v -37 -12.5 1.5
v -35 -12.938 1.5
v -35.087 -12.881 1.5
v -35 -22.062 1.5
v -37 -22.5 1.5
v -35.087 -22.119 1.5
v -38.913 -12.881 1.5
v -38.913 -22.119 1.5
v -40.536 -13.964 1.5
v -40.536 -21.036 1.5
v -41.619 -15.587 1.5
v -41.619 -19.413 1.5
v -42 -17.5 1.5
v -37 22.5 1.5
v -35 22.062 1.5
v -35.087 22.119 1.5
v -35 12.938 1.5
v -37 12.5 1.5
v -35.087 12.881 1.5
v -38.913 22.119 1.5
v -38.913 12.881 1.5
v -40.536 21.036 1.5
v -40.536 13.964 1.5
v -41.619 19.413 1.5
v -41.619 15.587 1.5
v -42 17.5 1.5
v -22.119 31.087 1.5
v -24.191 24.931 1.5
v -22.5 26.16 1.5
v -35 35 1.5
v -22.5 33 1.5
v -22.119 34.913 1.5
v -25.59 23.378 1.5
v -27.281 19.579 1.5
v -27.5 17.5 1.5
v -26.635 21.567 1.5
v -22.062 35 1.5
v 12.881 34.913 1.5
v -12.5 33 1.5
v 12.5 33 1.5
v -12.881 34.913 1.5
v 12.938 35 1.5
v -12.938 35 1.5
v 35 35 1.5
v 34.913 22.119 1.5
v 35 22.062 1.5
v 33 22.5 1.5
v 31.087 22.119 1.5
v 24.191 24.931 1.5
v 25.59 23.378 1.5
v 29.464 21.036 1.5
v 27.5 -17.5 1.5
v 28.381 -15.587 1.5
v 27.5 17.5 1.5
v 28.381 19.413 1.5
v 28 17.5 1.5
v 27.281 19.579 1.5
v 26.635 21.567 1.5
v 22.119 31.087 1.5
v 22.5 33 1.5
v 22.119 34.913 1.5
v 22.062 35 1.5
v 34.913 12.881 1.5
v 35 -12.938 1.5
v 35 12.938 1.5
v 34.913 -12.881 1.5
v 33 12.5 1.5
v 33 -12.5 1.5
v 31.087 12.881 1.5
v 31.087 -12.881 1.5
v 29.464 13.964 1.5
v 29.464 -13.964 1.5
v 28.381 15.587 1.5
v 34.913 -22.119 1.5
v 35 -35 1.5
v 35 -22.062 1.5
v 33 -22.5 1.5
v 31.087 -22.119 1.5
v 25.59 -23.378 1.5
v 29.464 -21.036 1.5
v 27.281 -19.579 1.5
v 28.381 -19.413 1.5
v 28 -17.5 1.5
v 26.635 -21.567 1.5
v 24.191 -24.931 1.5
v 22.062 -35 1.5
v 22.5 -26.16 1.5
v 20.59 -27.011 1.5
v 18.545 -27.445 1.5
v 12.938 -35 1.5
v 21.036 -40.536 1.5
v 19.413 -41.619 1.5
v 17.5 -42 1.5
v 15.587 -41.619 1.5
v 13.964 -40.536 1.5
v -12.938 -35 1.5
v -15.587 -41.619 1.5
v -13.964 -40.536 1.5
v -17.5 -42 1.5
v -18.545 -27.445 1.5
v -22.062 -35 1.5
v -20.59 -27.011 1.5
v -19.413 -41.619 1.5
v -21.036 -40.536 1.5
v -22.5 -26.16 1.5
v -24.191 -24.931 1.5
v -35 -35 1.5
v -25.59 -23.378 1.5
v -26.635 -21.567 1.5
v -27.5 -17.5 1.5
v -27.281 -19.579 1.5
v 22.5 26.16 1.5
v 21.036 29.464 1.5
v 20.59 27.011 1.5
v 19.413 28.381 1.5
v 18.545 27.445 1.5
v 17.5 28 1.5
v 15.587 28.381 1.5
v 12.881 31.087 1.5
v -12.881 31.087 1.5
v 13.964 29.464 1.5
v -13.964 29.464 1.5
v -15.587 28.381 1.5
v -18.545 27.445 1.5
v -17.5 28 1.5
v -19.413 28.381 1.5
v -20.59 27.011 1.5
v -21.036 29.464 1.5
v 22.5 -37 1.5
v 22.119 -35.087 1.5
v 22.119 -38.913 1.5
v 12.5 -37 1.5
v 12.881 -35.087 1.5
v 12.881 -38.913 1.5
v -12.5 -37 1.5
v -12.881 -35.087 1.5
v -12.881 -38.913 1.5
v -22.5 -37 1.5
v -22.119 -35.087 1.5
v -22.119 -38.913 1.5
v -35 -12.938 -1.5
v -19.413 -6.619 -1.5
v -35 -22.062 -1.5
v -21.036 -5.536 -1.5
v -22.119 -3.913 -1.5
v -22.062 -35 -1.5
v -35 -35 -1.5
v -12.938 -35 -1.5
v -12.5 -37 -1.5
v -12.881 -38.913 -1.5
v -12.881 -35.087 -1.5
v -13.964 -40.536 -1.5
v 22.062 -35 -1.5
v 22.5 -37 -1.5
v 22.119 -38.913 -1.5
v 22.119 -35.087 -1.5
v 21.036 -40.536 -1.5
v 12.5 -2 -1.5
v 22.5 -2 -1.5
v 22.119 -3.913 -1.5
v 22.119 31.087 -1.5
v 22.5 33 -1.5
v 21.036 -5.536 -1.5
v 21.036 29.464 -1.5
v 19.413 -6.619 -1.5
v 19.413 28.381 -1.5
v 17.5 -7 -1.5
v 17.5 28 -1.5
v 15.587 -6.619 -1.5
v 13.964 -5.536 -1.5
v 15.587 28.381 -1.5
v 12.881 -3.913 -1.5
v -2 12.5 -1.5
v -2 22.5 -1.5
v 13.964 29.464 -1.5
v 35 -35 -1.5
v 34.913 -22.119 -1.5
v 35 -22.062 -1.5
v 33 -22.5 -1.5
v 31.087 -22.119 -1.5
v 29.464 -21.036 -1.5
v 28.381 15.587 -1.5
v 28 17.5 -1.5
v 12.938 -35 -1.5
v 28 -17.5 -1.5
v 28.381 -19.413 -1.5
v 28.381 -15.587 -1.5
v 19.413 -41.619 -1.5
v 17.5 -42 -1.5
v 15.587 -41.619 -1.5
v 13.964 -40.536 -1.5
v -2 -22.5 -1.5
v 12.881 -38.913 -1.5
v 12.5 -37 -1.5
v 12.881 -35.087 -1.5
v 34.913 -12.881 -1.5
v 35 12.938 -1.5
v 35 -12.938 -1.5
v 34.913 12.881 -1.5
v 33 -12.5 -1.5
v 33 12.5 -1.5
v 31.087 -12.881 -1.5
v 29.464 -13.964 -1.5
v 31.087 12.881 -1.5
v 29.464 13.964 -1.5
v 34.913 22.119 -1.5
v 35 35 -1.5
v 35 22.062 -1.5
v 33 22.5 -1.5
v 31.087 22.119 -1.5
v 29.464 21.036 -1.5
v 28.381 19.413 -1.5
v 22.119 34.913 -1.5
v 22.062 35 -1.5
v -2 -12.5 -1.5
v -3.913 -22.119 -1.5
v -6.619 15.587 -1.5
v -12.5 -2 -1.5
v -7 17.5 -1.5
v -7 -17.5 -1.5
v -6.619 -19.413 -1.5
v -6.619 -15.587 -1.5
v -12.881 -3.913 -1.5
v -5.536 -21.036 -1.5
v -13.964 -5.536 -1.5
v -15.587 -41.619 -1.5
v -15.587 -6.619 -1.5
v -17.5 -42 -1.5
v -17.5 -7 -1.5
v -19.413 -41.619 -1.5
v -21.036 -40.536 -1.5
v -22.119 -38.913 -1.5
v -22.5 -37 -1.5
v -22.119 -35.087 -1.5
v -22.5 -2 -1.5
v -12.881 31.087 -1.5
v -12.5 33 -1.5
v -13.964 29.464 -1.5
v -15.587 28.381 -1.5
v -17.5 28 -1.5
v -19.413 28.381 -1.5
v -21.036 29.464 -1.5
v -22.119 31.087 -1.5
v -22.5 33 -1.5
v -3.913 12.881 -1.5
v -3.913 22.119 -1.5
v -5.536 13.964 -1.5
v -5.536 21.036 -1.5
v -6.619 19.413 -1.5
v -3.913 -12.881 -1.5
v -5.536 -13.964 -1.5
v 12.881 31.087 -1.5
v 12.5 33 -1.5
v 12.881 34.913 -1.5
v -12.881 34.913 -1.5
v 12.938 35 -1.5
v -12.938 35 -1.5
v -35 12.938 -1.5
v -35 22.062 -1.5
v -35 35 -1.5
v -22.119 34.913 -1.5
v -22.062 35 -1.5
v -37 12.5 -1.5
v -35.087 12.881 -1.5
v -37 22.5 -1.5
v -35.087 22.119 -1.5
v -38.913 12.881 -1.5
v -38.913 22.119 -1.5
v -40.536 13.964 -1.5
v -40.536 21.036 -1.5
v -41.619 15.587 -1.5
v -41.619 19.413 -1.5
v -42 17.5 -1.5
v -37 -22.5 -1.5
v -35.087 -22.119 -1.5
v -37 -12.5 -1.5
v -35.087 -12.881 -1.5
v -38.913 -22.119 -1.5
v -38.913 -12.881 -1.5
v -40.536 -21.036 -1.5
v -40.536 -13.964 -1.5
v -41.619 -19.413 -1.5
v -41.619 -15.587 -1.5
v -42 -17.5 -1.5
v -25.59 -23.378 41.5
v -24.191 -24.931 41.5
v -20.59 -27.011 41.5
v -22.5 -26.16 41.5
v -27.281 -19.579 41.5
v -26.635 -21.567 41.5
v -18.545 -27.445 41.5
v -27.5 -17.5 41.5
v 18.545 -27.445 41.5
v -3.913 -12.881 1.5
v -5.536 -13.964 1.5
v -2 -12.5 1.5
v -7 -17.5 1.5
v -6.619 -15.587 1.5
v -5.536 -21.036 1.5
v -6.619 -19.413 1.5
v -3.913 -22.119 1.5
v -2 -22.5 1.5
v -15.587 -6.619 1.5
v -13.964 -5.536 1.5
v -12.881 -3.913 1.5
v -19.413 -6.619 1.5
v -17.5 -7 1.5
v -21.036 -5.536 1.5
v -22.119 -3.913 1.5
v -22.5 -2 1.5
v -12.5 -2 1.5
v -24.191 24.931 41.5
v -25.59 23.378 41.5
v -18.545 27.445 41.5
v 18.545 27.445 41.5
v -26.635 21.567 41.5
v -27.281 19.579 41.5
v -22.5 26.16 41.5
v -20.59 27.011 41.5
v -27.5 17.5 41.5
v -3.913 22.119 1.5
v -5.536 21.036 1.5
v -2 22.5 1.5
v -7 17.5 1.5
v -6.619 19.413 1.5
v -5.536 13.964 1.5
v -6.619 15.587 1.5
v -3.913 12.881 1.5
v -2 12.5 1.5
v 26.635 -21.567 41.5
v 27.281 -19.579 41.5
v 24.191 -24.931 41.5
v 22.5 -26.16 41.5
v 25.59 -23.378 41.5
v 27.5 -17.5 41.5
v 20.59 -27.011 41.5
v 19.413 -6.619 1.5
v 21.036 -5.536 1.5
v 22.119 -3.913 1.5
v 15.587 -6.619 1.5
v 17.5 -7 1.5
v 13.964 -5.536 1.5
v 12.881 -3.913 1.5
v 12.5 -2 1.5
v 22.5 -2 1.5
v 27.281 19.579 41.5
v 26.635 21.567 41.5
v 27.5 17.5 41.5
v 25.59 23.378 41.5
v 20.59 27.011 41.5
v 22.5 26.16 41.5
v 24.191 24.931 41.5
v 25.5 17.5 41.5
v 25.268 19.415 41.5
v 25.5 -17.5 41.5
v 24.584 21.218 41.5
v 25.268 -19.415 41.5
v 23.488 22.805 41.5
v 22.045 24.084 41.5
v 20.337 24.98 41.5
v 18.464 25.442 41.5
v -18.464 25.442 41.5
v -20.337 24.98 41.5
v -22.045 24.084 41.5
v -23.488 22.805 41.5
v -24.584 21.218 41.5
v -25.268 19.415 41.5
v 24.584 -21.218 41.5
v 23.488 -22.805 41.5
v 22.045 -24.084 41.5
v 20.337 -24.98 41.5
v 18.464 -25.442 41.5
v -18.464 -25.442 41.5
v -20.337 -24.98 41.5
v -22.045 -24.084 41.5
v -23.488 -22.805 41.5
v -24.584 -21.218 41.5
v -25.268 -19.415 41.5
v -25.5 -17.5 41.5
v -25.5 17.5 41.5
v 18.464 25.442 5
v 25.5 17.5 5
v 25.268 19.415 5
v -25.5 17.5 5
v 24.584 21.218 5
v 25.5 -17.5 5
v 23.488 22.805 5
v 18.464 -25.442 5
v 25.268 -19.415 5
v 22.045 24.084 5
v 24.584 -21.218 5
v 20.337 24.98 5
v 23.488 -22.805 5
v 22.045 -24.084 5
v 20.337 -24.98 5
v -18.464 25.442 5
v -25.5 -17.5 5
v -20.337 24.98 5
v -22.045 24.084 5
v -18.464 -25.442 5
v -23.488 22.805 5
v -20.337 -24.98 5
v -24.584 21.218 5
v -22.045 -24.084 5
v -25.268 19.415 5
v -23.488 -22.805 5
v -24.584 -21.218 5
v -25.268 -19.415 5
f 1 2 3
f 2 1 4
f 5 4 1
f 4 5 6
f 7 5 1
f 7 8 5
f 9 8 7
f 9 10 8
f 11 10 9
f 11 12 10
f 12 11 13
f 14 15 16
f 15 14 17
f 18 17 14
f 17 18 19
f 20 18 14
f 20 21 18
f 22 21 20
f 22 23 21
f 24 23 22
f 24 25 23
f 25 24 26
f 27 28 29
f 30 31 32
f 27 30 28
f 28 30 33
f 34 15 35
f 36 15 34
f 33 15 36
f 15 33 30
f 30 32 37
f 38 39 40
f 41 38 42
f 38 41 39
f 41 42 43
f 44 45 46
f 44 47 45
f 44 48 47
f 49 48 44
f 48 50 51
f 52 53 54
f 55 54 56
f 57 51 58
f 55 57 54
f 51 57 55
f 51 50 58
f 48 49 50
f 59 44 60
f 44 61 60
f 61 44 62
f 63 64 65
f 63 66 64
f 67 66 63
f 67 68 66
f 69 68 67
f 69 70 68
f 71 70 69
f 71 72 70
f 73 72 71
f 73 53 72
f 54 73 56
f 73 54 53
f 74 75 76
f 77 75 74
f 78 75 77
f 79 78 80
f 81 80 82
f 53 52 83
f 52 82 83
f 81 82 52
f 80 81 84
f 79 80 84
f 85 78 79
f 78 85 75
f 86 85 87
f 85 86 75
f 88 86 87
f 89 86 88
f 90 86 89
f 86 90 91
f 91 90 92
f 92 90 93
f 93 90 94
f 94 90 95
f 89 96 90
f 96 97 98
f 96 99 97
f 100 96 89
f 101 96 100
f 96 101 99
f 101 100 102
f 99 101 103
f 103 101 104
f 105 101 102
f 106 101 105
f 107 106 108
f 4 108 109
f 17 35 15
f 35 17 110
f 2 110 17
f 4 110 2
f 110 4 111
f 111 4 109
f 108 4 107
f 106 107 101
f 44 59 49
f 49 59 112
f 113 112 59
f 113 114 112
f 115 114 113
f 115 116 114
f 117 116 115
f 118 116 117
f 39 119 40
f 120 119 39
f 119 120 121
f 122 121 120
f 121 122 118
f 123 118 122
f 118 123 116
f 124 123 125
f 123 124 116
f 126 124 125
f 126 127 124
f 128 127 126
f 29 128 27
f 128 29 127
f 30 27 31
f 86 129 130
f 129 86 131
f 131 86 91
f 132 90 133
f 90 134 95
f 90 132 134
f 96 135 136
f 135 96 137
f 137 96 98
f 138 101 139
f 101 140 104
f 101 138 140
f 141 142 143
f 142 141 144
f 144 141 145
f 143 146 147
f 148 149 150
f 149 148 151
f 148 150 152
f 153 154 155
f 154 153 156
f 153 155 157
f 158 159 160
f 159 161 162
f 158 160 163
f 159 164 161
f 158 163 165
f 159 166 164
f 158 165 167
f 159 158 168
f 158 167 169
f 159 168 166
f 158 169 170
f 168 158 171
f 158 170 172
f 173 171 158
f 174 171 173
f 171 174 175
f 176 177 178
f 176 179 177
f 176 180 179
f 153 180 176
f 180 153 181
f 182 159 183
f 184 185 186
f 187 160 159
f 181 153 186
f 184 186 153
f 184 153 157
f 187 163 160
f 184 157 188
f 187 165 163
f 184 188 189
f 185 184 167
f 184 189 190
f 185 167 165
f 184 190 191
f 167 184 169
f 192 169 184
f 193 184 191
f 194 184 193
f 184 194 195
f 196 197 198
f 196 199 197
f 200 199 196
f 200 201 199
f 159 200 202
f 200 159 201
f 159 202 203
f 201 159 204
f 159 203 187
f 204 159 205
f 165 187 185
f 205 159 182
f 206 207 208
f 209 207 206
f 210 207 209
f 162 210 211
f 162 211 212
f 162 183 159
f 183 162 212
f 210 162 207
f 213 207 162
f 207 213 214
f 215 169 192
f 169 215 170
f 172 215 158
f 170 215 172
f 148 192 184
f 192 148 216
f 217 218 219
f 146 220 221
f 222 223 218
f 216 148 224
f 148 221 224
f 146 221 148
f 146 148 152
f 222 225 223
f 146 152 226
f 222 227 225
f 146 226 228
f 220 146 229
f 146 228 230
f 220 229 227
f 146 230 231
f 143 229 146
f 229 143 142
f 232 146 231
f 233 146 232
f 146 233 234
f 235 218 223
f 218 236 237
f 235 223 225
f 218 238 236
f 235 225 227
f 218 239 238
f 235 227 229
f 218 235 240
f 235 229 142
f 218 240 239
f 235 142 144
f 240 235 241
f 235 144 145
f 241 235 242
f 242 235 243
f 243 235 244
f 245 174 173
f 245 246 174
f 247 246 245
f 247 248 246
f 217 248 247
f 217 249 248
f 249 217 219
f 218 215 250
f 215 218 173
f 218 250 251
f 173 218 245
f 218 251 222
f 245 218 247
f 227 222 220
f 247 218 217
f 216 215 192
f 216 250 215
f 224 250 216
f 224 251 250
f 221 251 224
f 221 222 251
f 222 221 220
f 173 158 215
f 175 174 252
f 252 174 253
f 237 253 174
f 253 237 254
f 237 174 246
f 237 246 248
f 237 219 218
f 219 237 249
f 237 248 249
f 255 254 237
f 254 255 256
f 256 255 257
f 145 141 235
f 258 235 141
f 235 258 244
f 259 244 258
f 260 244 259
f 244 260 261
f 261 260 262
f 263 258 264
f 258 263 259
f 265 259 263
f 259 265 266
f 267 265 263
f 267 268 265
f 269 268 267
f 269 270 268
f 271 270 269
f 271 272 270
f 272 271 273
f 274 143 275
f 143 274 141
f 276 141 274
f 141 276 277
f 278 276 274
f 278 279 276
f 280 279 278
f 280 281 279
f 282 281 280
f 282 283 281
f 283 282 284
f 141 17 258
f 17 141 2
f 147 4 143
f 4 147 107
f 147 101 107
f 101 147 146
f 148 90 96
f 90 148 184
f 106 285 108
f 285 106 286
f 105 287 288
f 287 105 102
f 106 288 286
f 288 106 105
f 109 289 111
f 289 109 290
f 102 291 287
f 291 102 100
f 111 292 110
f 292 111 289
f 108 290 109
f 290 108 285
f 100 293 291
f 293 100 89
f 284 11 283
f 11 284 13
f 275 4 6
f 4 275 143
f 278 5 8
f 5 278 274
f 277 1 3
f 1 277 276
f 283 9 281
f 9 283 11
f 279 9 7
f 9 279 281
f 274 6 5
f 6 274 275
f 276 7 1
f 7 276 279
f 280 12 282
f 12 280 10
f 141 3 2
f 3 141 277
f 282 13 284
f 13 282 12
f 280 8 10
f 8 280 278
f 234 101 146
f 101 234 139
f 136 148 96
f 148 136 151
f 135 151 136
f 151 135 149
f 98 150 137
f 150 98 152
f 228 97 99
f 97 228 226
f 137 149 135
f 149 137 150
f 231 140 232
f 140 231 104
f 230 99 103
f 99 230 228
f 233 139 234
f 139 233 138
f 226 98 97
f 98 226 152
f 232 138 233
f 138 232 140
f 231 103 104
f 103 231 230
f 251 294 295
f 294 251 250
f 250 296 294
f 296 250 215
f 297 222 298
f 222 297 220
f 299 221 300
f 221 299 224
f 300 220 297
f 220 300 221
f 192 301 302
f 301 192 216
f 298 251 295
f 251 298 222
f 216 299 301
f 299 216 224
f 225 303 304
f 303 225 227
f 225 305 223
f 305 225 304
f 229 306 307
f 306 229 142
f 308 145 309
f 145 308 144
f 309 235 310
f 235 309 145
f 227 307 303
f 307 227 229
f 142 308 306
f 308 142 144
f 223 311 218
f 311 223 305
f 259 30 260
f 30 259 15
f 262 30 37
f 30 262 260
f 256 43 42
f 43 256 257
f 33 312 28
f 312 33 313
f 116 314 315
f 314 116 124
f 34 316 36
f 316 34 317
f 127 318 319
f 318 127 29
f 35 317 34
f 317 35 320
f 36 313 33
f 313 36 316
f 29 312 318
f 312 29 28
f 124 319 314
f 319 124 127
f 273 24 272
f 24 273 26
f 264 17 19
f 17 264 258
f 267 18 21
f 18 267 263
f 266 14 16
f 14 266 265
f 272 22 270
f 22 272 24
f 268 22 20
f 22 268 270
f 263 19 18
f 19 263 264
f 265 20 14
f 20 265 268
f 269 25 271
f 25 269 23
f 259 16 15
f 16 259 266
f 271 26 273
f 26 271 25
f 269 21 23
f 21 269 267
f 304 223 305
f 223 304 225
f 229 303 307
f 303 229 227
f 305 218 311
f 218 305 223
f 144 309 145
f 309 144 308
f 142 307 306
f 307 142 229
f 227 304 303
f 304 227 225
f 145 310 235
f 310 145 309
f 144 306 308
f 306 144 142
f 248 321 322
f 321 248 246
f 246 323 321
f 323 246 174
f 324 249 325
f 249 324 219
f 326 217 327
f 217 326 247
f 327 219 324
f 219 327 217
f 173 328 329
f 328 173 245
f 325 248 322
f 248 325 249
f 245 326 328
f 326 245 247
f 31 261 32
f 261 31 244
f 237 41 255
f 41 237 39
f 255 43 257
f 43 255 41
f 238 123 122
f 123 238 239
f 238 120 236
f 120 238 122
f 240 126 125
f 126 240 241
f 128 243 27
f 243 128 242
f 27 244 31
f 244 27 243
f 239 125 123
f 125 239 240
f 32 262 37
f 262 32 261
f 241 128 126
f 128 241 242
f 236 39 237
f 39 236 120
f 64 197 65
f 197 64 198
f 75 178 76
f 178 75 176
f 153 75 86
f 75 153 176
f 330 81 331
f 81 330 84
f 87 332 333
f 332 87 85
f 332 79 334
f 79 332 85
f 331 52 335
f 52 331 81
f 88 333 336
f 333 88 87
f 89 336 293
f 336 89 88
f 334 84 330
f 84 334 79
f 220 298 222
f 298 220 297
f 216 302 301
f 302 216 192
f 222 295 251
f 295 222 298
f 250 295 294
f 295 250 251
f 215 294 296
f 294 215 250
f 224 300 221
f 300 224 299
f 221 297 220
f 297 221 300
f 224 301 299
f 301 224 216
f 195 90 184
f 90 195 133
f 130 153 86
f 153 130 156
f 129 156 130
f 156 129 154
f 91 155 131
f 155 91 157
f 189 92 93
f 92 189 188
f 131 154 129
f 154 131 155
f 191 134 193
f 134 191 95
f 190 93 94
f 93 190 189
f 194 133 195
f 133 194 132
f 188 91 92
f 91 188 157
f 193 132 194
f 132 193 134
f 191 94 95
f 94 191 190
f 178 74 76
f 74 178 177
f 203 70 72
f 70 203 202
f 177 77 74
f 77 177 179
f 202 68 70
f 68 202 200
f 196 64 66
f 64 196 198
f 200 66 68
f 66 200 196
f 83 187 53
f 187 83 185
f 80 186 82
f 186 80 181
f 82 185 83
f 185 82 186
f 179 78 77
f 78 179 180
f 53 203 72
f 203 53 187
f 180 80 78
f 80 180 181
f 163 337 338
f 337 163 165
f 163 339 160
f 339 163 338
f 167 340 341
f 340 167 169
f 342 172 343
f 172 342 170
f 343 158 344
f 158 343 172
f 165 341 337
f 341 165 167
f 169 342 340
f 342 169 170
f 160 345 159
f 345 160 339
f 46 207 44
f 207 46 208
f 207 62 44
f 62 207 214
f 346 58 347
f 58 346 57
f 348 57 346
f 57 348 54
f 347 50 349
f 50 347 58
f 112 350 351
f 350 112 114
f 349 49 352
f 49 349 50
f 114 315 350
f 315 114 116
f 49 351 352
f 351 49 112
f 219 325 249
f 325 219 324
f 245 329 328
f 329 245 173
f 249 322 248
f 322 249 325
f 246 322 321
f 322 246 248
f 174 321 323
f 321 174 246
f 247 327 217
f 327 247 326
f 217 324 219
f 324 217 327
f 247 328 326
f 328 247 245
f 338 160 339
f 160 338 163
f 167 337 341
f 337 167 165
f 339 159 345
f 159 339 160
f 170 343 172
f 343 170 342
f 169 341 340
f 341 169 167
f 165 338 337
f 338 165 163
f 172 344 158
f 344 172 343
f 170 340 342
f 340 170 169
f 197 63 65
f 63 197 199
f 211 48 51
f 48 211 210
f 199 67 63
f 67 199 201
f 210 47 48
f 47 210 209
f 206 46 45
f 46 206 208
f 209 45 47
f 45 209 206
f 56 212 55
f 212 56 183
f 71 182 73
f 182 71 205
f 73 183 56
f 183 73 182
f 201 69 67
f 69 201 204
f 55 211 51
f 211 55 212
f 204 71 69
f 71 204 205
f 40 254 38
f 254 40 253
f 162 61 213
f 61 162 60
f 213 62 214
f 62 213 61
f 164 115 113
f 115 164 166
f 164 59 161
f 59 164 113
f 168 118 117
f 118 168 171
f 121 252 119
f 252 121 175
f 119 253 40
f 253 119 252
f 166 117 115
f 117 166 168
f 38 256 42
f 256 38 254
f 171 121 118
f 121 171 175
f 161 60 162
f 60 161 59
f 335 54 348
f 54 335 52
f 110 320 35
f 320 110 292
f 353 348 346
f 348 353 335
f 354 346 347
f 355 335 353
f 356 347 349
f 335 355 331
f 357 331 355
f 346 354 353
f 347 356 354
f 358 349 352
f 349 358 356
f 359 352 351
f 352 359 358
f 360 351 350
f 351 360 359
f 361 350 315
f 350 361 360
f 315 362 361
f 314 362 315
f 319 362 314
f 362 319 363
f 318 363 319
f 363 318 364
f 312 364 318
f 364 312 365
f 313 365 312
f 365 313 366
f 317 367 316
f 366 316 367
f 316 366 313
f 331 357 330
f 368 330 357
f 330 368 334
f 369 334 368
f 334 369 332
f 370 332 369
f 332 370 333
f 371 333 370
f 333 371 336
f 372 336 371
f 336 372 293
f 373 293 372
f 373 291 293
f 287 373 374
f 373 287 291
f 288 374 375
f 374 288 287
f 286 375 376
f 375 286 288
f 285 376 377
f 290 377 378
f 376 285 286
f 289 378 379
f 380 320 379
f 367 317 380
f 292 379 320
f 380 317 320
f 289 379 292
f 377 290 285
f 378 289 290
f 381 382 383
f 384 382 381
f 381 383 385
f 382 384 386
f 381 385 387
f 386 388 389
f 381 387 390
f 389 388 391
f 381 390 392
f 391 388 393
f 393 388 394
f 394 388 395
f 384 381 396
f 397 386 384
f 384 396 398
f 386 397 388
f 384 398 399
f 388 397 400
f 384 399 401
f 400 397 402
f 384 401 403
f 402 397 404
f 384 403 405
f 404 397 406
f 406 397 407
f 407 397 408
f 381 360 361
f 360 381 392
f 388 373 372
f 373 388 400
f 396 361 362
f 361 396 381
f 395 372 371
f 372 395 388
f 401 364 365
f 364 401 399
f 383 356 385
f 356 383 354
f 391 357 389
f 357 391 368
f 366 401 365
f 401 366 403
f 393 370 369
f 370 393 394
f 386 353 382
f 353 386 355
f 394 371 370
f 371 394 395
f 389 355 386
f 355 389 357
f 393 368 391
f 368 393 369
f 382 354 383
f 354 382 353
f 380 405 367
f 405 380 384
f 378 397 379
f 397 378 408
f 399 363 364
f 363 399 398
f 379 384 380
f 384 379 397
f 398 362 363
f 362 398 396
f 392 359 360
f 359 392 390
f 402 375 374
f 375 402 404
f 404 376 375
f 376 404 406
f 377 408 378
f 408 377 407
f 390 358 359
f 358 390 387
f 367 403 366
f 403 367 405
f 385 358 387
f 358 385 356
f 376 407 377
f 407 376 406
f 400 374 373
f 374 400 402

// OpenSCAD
// file: base.scad
//$fa=5; $fs=0.1;

// стыкабельное основание
module base(){
	difference(){
		union(){
			cube([35,35,3], center=true);	 // база
			translate([0, 0, 3]) cylinder(h=3, r=10, center=true);
			translate([-19.5, 0, 0]) cylinder(h=3, r=5, center=true); // выступы
			translate([0, -19.5, 0]) cylinder(h=3, r=5, center=true);
		}

		union(){
			translate([15.5, 0, 0]) cylinder(h=3.2, r=5, center=true); // прорези
			translate([0, 15.5, 0]) cylinder(h=3.2, r=5, center=true);
		}
	}
}

base();
// main file
//$fa=5; $fs=0.1;

use <base.scad>;

module box_4seg(){
	translate([-17.5,-17.5,0]) base();
	translate([-17.5,17.5,0]) base();
	translate([17.5,-17.5,0]) base();
	translate([17.5,17.5,0]) base();
	
	difference(){
	
	hull(){
		translate([-17.5,-17.5, 21.5]) cylinder(h=40, r=10, center=true);
		translate([-17.5,17.5, 21.5]) cylinder(h=40, r=10, center=true);
		translate([17.5,-17.5, 21.5]) cylinder(h=40, r=10, center=true);
		translate([17.5,17.5, 21.5]) cylinder(h=40, r=10, center=true);
	}
	
	hull(){
		translate([-17.5,-17.5, 25]) cylinder(h=40, r=8, center=true);
		translate([-17.5,17.5, 25]) cylinder(h=40, r=8, center=true);
		translate([17.5,-17.5, 25]) cylinder(h=40, r=8, center=true);
		translate([17.5,17.5, 25]) cylinder(h=40, r=8, center=true);
	}
	
	}
}

box_4seg();
